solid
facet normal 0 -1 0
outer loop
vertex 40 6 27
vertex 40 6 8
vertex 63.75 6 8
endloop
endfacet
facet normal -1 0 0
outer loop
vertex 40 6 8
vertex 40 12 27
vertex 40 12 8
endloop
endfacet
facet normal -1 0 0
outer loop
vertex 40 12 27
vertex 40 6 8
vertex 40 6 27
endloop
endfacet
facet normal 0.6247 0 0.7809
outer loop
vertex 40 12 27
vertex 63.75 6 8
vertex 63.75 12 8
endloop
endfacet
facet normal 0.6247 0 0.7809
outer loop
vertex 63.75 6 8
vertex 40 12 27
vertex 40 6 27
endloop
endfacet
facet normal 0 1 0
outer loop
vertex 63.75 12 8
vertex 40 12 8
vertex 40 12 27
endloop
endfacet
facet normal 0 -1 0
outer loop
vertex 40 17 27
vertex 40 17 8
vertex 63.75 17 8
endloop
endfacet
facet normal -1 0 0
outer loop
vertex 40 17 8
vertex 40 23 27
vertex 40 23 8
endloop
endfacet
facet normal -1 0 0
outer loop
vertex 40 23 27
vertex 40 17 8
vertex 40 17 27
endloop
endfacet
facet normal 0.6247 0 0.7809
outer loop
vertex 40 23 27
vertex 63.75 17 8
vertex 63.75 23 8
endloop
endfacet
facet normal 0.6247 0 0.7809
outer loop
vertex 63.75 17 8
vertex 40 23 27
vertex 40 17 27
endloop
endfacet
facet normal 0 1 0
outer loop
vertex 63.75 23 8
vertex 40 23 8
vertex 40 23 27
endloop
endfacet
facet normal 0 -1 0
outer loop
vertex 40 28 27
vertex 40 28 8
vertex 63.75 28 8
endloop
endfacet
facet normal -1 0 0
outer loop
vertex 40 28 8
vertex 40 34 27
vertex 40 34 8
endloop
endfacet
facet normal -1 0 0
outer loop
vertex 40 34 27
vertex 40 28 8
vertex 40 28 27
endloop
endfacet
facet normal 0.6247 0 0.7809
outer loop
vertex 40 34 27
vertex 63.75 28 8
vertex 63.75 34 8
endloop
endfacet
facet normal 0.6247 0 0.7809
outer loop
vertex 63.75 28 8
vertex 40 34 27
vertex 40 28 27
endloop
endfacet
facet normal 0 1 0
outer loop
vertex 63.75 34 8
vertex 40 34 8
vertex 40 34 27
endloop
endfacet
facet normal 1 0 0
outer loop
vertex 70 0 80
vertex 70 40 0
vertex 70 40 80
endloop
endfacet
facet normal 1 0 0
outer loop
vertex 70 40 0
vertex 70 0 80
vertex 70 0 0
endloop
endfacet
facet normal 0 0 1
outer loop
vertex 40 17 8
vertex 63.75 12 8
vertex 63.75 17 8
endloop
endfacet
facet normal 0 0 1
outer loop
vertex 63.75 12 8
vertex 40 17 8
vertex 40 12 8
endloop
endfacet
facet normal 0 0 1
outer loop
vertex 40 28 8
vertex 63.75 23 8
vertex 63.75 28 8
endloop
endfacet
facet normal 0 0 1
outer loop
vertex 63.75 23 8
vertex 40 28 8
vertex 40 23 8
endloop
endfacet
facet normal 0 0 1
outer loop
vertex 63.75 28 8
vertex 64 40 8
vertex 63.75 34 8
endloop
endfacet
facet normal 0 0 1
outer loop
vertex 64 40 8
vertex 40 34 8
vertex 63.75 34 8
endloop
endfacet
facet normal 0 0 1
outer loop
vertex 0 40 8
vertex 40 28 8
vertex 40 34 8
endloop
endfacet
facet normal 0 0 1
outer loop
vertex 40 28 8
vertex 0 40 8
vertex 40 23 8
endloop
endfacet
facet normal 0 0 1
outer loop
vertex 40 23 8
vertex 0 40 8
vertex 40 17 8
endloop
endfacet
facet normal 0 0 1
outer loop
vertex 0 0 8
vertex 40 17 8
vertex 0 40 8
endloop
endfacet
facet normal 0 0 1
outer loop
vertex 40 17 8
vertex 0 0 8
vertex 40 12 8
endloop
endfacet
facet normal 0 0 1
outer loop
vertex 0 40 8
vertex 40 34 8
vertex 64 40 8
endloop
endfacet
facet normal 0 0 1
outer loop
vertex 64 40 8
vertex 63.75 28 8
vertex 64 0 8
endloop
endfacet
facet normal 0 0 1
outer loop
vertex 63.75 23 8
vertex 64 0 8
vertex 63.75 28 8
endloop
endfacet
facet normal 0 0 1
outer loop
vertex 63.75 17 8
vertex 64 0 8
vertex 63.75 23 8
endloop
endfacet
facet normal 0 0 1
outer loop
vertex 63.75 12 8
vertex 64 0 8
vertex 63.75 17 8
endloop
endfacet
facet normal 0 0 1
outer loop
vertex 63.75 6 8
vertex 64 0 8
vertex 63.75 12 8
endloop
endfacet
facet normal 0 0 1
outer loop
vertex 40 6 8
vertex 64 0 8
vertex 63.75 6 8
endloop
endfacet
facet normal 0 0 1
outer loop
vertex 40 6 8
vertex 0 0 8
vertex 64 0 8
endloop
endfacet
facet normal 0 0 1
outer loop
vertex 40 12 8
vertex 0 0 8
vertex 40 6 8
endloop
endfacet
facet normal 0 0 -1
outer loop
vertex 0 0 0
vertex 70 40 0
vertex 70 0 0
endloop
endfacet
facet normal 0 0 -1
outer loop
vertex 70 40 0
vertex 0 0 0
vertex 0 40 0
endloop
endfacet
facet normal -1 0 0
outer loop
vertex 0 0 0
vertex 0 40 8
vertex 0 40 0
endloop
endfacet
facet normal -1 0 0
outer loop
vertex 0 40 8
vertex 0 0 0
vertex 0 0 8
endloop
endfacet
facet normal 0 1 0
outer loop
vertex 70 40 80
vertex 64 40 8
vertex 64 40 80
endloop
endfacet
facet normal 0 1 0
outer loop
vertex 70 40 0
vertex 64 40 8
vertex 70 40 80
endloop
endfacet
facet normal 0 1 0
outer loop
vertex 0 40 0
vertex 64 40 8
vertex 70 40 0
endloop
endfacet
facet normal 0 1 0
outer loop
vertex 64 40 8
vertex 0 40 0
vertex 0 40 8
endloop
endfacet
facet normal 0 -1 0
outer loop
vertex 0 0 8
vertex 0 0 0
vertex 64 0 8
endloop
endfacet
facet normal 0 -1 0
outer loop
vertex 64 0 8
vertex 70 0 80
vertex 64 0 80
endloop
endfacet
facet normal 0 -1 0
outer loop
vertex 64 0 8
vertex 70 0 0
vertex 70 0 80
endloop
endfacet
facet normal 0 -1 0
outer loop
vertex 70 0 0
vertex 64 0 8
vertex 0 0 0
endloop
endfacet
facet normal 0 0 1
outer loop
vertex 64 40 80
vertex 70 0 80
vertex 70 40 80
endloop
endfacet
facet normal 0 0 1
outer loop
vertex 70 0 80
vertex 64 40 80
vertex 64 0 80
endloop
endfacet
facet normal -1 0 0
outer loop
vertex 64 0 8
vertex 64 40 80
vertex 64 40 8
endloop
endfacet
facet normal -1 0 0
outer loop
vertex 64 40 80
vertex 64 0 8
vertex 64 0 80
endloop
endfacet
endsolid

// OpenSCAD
$fn = 32;

// ----------------------------------------------------------------------
// Rib bracket: 3-gusset L bracket
// ----------------------------------------------------------------------

// --- parameters (mm) ---
base_l = 70;              // foot length, X
base_w = 40;              // foot width, Y
base_t = 8;               // foot thickness
plate_t = 6;              // upright plate thickness
plate_h = 80;             // overall height
gus_l = 24;               // gusset leg along the foot
gus_h = 20;               // gusset height
gus_t = 6;                // gusset thickness
gus_edge = 6;             // gusset margin from the foot edge
n_gus = 3;                // gusset count

gus_pitch = (base_w - 2 * gus_edge - gus_t) / (n_gus - 1);  // gusset pitch

union() {
  cube([base_l, base_w, base_t]);
  translate([base_l - plate_t, 0, base_t - 1])
    cube([plate_t, base_w, plate_h - base_t + 1]);
  for (i = [0 : n_gus - 1])
    translate([base_l - plate_t - gus_l, gus_edge + i * gus_pitch, base_t - 1])
      rotate([-90, 0, 0])
        linear_extrude(height = gus_t)
          polygon(points = [[0, 0], [gus_l + 1, 0], [0, -gus_h]]);
}
